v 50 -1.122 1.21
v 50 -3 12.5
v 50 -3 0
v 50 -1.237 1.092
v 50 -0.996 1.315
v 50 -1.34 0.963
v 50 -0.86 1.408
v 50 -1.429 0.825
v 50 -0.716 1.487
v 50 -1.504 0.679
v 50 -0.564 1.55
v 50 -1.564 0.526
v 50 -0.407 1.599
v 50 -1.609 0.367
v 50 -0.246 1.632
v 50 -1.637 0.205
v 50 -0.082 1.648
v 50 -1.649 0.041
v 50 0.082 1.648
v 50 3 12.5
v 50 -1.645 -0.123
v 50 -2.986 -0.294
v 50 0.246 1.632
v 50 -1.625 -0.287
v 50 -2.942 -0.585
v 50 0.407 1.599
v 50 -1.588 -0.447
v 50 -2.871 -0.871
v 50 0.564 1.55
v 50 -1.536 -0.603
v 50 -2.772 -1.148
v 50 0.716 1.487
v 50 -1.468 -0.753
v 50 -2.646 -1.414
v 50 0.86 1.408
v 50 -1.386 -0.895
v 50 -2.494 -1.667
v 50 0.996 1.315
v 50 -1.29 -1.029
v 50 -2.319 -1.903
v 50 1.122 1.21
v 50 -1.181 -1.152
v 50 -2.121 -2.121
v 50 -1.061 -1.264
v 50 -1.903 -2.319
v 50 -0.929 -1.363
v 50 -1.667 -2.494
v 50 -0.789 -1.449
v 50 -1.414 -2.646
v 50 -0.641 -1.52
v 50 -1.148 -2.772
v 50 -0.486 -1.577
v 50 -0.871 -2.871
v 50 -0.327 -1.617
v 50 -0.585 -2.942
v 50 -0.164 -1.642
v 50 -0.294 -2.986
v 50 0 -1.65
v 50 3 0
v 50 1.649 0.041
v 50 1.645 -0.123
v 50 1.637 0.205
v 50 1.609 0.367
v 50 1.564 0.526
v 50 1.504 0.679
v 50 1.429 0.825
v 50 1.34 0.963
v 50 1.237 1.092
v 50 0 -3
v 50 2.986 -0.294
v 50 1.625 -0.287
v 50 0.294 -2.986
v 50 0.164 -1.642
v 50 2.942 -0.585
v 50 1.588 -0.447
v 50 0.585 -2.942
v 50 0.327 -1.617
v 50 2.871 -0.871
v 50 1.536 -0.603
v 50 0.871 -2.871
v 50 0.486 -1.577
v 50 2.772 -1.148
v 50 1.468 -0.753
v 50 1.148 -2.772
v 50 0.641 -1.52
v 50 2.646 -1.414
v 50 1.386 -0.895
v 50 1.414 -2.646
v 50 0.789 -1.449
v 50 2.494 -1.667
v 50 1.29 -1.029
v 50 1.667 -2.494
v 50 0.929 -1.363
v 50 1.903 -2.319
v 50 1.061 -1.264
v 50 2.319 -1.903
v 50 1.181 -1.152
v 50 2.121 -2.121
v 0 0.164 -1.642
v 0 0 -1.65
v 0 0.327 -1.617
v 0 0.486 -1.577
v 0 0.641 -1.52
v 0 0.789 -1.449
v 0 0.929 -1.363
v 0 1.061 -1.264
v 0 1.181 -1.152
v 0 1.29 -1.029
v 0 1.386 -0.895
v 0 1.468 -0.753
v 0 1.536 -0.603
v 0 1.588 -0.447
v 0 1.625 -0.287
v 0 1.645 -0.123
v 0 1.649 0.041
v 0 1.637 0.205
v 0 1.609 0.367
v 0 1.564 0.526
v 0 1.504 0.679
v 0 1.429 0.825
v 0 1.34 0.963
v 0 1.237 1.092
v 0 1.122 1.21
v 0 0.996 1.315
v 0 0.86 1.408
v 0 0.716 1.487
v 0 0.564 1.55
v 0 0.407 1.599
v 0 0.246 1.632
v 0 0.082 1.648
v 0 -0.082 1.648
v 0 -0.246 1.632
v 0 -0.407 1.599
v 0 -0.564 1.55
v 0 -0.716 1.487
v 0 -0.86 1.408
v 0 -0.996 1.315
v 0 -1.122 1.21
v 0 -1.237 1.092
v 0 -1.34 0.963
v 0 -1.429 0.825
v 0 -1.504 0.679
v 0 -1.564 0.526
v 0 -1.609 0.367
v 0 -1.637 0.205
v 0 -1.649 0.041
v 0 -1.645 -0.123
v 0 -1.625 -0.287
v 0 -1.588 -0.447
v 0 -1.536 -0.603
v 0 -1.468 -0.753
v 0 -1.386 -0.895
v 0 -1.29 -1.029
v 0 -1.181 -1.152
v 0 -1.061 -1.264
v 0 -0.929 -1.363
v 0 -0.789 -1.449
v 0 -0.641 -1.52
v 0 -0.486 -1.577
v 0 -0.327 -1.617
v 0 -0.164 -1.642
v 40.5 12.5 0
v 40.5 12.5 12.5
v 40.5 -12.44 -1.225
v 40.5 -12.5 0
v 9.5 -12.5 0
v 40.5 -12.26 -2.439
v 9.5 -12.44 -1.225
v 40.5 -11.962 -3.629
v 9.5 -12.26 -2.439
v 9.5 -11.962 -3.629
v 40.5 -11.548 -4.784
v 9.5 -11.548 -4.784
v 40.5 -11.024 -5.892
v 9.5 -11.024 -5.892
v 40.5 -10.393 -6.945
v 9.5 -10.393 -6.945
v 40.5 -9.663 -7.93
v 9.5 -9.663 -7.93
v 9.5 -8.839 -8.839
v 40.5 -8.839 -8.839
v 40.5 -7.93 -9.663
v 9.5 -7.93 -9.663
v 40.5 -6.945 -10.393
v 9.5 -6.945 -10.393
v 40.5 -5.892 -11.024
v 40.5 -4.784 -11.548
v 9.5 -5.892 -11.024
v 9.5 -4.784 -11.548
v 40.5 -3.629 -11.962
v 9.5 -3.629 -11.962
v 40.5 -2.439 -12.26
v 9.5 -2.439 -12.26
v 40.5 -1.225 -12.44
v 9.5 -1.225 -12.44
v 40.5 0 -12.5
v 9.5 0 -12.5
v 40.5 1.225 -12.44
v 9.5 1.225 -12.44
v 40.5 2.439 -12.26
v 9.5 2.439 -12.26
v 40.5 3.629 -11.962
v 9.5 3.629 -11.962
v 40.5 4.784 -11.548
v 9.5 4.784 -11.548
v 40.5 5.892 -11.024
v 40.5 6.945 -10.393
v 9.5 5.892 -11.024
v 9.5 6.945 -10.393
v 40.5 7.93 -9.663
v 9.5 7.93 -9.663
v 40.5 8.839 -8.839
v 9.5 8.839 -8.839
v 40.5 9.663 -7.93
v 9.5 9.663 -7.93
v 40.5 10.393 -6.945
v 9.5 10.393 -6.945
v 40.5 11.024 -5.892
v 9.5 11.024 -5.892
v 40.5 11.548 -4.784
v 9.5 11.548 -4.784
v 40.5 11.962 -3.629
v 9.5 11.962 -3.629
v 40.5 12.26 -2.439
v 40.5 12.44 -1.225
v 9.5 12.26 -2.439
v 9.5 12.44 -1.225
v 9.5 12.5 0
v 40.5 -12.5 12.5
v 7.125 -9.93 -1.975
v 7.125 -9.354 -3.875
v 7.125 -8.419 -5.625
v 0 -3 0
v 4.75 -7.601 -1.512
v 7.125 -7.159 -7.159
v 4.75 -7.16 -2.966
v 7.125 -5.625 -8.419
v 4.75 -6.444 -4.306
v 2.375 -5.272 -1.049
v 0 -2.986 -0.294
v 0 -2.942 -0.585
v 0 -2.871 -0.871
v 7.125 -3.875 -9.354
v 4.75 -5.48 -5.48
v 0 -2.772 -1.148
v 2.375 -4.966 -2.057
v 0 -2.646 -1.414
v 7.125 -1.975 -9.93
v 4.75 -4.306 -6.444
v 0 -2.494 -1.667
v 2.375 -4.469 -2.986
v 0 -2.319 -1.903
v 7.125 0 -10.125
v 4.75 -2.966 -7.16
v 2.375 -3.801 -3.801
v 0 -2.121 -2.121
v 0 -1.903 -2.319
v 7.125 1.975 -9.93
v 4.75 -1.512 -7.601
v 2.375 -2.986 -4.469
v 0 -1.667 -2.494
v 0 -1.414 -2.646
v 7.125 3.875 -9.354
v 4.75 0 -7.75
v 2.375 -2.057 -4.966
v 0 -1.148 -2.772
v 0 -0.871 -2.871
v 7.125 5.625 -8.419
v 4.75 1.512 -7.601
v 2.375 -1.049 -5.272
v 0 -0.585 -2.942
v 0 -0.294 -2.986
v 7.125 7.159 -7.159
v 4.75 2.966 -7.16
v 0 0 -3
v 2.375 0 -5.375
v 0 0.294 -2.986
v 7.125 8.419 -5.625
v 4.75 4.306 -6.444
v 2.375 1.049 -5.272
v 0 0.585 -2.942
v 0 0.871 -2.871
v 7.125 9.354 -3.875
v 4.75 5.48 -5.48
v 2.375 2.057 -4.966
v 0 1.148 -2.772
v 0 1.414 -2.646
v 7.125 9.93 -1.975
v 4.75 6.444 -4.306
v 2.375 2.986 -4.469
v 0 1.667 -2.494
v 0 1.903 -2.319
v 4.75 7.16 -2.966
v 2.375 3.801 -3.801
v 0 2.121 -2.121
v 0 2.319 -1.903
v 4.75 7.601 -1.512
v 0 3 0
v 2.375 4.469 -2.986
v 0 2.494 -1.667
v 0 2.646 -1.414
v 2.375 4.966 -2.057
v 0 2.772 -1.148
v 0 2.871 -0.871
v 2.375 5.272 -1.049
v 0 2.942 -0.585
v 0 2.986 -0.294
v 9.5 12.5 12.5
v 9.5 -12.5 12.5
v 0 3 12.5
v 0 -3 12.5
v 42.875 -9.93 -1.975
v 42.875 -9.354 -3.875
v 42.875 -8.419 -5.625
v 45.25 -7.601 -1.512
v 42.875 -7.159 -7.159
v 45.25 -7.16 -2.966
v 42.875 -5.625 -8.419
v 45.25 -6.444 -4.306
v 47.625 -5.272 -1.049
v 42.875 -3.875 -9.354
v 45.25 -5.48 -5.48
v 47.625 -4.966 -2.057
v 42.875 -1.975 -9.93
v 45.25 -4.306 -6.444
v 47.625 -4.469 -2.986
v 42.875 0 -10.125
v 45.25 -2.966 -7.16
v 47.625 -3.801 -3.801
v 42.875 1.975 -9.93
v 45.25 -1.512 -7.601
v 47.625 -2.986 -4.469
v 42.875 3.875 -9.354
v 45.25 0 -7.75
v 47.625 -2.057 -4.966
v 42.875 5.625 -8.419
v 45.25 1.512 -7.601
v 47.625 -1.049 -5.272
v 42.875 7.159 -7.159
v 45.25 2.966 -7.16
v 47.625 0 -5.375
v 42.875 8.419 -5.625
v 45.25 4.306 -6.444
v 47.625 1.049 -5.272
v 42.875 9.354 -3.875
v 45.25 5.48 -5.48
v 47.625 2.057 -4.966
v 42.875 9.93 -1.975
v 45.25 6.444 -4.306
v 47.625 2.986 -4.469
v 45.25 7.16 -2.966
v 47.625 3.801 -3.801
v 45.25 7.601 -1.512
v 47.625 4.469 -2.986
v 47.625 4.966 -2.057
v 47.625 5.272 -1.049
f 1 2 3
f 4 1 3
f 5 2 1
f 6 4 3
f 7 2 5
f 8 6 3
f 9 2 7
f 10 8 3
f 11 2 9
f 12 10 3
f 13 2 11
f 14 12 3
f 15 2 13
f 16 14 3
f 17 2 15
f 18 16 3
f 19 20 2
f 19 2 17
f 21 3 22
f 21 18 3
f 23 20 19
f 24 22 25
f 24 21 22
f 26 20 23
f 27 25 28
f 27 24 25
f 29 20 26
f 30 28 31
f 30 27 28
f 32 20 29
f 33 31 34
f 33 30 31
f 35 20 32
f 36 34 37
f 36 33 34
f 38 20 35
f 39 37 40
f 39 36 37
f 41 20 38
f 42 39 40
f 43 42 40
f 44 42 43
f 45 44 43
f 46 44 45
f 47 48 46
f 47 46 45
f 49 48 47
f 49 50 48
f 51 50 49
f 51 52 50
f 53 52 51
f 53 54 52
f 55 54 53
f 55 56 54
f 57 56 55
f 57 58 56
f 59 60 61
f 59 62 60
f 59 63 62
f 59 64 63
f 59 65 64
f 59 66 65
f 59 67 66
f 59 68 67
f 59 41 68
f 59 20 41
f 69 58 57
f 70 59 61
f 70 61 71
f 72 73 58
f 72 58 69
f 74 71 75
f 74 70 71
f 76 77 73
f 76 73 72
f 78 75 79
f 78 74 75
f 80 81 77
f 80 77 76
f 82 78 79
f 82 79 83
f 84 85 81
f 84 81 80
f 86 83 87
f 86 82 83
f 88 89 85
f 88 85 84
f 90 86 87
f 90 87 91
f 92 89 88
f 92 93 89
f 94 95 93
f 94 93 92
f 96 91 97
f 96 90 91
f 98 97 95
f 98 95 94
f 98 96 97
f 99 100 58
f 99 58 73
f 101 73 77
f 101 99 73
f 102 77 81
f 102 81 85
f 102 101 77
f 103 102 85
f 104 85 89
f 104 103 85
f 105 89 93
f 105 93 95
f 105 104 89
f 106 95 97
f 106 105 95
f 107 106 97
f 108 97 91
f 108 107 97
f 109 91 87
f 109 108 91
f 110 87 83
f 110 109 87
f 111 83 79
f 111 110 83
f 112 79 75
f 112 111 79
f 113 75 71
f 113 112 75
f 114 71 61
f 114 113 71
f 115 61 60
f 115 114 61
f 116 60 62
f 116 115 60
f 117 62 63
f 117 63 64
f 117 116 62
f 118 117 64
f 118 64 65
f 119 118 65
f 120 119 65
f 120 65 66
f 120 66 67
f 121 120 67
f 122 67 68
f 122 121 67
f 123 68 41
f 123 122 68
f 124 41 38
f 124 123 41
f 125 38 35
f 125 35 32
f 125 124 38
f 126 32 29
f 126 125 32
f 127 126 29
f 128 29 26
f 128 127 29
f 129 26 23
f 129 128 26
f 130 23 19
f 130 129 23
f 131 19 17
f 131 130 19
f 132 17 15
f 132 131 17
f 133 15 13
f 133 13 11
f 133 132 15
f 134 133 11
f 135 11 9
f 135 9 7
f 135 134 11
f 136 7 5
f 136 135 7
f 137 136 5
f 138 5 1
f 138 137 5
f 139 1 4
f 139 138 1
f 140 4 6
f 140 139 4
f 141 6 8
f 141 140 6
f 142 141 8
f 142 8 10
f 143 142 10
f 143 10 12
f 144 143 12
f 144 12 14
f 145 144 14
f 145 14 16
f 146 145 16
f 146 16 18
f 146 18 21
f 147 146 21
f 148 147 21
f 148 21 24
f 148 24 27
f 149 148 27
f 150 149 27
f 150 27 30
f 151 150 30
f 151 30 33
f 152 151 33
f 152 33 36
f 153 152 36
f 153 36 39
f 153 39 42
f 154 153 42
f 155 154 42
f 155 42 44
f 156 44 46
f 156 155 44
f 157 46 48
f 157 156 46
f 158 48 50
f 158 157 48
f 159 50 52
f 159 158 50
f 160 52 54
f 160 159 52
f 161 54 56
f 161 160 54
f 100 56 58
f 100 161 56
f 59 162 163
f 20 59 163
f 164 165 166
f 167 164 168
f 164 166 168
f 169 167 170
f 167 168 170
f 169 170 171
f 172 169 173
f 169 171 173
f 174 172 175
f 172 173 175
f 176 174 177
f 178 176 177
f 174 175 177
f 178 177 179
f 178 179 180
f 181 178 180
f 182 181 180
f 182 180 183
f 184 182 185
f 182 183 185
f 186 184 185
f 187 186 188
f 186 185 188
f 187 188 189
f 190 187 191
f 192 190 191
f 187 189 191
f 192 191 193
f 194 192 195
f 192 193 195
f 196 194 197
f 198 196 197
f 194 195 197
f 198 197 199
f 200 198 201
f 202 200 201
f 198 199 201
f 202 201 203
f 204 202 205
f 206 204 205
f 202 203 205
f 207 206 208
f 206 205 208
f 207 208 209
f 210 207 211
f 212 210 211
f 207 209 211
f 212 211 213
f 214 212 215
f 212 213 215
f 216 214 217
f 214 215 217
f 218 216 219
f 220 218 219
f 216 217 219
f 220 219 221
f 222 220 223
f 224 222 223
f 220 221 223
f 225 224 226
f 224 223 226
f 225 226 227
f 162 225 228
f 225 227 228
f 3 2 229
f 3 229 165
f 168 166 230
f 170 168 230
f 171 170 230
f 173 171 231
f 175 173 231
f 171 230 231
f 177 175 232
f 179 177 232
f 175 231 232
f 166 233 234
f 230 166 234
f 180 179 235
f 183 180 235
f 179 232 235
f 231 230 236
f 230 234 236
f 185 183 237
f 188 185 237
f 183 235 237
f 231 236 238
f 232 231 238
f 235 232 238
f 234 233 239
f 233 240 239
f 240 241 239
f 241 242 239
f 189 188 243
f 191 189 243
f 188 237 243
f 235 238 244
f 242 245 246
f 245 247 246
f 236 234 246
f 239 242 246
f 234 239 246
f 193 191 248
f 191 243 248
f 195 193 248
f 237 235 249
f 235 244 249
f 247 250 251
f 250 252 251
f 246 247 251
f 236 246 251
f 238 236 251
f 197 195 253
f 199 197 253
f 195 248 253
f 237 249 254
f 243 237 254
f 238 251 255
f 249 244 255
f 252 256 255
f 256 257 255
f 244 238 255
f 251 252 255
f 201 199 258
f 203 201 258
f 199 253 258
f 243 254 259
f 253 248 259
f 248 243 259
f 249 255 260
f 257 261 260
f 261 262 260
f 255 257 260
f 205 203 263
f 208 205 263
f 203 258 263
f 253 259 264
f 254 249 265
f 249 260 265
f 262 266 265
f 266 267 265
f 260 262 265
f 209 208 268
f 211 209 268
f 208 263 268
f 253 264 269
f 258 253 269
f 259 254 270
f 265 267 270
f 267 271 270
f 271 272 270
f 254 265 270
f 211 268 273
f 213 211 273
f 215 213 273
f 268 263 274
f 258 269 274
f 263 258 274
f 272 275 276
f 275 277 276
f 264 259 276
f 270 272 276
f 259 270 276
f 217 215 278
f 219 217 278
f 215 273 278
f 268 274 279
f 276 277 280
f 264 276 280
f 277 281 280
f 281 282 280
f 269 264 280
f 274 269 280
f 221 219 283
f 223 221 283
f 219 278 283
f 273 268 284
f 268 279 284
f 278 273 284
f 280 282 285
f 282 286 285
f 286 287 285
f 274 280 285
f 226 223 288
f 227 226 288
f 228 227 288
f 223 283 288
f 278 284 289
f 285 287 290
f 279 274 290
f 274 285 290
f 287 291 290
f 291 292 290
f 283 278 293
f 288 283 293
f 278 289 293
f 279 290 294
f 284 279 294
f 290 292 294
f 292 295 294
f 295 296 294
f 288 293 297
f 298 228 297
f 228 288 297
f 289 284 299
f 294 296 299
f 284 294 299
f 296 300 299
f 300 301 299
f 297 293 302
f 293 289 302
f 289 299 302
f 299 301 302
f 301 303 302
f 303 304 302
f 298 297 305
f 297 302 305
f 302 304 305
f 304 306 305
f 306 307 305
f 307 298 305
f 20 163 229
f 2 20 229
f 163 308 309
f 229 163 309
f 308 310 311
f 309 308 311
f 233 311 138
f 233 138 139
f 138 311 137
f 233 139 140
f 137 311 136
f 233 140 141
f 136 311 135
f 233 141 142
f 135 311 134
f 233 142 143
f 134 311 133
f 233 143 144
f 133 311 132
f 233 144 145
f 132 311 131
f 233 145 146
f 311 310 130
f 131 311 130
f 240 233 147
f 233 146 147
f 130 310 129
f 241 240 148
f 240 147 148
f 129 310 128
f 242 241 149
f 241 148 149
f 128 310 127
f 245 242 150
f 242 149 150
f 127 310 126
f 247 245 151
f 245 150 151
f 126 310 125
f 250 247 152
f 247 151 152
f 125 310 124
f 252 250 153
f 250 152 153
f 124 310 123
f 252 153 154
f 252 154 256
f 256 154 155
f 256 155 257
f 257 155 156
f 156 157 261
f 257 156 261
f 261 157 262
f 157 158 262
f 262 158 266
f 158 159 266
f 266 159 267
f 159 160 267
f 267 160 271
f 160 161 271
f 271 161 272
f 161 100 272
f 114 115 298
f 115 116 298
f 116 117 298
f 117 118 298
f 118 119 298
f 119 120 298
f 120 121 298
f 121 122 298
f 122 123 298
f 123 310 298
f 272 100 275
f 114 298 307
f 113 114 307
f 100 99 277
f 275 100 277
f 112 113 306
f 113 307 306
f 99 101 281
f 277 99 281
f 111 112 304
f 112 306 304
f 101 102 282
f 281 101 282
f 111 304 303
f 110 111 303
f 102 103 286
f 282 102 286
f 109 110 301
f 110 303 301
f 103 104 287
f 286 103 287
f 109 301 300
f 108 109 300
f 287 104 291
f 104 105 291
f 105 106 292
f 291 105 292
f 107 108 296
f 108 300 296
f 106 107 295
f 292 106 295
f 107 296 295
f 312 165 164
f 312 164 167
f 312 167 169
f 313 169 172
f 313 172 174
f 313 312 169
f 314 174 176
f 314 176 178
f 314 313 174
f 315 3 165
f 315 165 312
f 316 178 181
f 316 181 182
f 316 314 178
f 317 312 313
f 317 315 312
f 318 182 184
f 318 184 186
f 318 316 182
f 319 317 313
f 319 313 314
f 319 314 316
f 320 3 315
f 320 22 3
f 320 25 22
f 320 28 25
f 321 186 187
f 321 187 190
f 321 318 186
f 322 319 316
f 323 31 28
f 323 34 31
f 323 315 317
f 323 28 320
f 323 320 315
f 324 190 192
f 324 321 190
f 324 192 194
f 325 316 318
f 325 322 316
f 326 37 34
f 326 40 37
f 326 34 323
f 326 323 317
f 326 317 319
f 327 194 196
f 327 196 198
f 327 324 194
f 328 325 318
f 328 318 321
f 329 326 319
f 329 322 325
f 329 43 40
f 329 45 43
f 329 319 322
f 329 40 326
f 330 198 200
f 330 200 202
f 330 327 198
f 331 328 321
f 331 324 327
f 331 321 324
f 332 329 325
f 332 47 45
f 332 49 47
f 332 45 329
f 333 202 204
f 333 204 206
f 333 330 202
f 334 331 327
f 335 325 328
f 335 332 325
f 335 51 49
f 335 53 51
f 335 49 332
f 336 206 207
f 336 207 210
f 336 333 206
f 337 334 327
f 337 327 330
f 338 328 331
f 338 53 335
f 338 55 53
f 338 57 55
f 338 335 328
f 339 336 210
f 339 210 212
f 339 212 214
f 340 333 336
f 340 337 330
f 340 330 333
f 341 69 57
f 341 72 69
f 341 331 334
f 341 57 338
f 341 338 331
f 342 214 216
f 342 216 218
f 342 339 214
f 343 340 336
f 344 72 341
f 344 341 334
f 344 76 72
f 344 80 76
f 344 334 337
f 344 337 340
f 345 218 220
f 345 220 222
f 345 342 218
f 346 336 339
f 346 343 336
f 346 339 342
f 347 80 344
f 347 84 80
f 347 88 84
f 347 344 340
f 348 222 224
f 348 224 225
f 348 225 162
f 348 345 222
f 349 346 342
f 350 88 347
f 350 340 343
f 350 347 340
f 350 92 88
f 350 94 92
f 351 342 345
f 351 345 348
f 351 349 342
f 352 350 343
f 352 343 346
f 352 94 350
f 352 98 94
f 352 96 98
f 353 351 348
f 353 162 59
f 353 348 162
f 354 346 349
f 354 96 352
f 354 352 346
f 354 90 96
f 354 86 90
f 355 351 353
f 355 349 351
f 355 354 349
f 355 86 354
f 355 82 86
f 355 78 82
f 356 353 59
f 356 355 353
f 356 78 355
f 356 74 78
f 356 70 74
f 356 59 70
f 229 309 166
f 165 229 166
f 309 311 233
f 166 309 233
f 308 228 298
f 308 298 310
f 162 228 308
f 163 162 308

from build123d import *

# Parameters (mm, degrees)
SKETCH1_R           = 1.65
BOSS_EXTRUDE1_DEPTH = 50
CHAMFER1_SIZE       = 9.5


with BuildPart() as part:
    # Sketch1 → Boss-Extrude1 (new body)
    with BuildSketch(Plane(origin=(0, 0, 0), x_dir=(0, 0, -1), z_dir=(1, 0, 0))):
        with BuildLine():
            Line((0, 12.5), (-12.5, 12.5))
            Line((-12.5, 12.5), (-12.5, -12.5))
            Line((-12.5, -12.5), (0, -12.5))
            ThreePointArc((0, -12.5), (12.5, 0), (0, 12.5))
        make_face()
        Circle(SKETCH1_R, mode=Mode.SUBTRACT)
    extrude(amount=BOSS_EXTRUDE1_DEPTH)

    # Chamfer1
    chamfer1_edges = [part.edges().sort_by_distance(p)[0] for p in [
        (50, 12.5, 6.25),
        (50, -12.5, 6.25),
        (0, 12.5, 6.25),
        (0, 0, -12.5),
        (0, -12.5, 6.25),
        (50, 0, -12.5),
    ]]
    chamfer(chamfer1_edges, length=CHAMFER1_SIZE)


solid = part.part
